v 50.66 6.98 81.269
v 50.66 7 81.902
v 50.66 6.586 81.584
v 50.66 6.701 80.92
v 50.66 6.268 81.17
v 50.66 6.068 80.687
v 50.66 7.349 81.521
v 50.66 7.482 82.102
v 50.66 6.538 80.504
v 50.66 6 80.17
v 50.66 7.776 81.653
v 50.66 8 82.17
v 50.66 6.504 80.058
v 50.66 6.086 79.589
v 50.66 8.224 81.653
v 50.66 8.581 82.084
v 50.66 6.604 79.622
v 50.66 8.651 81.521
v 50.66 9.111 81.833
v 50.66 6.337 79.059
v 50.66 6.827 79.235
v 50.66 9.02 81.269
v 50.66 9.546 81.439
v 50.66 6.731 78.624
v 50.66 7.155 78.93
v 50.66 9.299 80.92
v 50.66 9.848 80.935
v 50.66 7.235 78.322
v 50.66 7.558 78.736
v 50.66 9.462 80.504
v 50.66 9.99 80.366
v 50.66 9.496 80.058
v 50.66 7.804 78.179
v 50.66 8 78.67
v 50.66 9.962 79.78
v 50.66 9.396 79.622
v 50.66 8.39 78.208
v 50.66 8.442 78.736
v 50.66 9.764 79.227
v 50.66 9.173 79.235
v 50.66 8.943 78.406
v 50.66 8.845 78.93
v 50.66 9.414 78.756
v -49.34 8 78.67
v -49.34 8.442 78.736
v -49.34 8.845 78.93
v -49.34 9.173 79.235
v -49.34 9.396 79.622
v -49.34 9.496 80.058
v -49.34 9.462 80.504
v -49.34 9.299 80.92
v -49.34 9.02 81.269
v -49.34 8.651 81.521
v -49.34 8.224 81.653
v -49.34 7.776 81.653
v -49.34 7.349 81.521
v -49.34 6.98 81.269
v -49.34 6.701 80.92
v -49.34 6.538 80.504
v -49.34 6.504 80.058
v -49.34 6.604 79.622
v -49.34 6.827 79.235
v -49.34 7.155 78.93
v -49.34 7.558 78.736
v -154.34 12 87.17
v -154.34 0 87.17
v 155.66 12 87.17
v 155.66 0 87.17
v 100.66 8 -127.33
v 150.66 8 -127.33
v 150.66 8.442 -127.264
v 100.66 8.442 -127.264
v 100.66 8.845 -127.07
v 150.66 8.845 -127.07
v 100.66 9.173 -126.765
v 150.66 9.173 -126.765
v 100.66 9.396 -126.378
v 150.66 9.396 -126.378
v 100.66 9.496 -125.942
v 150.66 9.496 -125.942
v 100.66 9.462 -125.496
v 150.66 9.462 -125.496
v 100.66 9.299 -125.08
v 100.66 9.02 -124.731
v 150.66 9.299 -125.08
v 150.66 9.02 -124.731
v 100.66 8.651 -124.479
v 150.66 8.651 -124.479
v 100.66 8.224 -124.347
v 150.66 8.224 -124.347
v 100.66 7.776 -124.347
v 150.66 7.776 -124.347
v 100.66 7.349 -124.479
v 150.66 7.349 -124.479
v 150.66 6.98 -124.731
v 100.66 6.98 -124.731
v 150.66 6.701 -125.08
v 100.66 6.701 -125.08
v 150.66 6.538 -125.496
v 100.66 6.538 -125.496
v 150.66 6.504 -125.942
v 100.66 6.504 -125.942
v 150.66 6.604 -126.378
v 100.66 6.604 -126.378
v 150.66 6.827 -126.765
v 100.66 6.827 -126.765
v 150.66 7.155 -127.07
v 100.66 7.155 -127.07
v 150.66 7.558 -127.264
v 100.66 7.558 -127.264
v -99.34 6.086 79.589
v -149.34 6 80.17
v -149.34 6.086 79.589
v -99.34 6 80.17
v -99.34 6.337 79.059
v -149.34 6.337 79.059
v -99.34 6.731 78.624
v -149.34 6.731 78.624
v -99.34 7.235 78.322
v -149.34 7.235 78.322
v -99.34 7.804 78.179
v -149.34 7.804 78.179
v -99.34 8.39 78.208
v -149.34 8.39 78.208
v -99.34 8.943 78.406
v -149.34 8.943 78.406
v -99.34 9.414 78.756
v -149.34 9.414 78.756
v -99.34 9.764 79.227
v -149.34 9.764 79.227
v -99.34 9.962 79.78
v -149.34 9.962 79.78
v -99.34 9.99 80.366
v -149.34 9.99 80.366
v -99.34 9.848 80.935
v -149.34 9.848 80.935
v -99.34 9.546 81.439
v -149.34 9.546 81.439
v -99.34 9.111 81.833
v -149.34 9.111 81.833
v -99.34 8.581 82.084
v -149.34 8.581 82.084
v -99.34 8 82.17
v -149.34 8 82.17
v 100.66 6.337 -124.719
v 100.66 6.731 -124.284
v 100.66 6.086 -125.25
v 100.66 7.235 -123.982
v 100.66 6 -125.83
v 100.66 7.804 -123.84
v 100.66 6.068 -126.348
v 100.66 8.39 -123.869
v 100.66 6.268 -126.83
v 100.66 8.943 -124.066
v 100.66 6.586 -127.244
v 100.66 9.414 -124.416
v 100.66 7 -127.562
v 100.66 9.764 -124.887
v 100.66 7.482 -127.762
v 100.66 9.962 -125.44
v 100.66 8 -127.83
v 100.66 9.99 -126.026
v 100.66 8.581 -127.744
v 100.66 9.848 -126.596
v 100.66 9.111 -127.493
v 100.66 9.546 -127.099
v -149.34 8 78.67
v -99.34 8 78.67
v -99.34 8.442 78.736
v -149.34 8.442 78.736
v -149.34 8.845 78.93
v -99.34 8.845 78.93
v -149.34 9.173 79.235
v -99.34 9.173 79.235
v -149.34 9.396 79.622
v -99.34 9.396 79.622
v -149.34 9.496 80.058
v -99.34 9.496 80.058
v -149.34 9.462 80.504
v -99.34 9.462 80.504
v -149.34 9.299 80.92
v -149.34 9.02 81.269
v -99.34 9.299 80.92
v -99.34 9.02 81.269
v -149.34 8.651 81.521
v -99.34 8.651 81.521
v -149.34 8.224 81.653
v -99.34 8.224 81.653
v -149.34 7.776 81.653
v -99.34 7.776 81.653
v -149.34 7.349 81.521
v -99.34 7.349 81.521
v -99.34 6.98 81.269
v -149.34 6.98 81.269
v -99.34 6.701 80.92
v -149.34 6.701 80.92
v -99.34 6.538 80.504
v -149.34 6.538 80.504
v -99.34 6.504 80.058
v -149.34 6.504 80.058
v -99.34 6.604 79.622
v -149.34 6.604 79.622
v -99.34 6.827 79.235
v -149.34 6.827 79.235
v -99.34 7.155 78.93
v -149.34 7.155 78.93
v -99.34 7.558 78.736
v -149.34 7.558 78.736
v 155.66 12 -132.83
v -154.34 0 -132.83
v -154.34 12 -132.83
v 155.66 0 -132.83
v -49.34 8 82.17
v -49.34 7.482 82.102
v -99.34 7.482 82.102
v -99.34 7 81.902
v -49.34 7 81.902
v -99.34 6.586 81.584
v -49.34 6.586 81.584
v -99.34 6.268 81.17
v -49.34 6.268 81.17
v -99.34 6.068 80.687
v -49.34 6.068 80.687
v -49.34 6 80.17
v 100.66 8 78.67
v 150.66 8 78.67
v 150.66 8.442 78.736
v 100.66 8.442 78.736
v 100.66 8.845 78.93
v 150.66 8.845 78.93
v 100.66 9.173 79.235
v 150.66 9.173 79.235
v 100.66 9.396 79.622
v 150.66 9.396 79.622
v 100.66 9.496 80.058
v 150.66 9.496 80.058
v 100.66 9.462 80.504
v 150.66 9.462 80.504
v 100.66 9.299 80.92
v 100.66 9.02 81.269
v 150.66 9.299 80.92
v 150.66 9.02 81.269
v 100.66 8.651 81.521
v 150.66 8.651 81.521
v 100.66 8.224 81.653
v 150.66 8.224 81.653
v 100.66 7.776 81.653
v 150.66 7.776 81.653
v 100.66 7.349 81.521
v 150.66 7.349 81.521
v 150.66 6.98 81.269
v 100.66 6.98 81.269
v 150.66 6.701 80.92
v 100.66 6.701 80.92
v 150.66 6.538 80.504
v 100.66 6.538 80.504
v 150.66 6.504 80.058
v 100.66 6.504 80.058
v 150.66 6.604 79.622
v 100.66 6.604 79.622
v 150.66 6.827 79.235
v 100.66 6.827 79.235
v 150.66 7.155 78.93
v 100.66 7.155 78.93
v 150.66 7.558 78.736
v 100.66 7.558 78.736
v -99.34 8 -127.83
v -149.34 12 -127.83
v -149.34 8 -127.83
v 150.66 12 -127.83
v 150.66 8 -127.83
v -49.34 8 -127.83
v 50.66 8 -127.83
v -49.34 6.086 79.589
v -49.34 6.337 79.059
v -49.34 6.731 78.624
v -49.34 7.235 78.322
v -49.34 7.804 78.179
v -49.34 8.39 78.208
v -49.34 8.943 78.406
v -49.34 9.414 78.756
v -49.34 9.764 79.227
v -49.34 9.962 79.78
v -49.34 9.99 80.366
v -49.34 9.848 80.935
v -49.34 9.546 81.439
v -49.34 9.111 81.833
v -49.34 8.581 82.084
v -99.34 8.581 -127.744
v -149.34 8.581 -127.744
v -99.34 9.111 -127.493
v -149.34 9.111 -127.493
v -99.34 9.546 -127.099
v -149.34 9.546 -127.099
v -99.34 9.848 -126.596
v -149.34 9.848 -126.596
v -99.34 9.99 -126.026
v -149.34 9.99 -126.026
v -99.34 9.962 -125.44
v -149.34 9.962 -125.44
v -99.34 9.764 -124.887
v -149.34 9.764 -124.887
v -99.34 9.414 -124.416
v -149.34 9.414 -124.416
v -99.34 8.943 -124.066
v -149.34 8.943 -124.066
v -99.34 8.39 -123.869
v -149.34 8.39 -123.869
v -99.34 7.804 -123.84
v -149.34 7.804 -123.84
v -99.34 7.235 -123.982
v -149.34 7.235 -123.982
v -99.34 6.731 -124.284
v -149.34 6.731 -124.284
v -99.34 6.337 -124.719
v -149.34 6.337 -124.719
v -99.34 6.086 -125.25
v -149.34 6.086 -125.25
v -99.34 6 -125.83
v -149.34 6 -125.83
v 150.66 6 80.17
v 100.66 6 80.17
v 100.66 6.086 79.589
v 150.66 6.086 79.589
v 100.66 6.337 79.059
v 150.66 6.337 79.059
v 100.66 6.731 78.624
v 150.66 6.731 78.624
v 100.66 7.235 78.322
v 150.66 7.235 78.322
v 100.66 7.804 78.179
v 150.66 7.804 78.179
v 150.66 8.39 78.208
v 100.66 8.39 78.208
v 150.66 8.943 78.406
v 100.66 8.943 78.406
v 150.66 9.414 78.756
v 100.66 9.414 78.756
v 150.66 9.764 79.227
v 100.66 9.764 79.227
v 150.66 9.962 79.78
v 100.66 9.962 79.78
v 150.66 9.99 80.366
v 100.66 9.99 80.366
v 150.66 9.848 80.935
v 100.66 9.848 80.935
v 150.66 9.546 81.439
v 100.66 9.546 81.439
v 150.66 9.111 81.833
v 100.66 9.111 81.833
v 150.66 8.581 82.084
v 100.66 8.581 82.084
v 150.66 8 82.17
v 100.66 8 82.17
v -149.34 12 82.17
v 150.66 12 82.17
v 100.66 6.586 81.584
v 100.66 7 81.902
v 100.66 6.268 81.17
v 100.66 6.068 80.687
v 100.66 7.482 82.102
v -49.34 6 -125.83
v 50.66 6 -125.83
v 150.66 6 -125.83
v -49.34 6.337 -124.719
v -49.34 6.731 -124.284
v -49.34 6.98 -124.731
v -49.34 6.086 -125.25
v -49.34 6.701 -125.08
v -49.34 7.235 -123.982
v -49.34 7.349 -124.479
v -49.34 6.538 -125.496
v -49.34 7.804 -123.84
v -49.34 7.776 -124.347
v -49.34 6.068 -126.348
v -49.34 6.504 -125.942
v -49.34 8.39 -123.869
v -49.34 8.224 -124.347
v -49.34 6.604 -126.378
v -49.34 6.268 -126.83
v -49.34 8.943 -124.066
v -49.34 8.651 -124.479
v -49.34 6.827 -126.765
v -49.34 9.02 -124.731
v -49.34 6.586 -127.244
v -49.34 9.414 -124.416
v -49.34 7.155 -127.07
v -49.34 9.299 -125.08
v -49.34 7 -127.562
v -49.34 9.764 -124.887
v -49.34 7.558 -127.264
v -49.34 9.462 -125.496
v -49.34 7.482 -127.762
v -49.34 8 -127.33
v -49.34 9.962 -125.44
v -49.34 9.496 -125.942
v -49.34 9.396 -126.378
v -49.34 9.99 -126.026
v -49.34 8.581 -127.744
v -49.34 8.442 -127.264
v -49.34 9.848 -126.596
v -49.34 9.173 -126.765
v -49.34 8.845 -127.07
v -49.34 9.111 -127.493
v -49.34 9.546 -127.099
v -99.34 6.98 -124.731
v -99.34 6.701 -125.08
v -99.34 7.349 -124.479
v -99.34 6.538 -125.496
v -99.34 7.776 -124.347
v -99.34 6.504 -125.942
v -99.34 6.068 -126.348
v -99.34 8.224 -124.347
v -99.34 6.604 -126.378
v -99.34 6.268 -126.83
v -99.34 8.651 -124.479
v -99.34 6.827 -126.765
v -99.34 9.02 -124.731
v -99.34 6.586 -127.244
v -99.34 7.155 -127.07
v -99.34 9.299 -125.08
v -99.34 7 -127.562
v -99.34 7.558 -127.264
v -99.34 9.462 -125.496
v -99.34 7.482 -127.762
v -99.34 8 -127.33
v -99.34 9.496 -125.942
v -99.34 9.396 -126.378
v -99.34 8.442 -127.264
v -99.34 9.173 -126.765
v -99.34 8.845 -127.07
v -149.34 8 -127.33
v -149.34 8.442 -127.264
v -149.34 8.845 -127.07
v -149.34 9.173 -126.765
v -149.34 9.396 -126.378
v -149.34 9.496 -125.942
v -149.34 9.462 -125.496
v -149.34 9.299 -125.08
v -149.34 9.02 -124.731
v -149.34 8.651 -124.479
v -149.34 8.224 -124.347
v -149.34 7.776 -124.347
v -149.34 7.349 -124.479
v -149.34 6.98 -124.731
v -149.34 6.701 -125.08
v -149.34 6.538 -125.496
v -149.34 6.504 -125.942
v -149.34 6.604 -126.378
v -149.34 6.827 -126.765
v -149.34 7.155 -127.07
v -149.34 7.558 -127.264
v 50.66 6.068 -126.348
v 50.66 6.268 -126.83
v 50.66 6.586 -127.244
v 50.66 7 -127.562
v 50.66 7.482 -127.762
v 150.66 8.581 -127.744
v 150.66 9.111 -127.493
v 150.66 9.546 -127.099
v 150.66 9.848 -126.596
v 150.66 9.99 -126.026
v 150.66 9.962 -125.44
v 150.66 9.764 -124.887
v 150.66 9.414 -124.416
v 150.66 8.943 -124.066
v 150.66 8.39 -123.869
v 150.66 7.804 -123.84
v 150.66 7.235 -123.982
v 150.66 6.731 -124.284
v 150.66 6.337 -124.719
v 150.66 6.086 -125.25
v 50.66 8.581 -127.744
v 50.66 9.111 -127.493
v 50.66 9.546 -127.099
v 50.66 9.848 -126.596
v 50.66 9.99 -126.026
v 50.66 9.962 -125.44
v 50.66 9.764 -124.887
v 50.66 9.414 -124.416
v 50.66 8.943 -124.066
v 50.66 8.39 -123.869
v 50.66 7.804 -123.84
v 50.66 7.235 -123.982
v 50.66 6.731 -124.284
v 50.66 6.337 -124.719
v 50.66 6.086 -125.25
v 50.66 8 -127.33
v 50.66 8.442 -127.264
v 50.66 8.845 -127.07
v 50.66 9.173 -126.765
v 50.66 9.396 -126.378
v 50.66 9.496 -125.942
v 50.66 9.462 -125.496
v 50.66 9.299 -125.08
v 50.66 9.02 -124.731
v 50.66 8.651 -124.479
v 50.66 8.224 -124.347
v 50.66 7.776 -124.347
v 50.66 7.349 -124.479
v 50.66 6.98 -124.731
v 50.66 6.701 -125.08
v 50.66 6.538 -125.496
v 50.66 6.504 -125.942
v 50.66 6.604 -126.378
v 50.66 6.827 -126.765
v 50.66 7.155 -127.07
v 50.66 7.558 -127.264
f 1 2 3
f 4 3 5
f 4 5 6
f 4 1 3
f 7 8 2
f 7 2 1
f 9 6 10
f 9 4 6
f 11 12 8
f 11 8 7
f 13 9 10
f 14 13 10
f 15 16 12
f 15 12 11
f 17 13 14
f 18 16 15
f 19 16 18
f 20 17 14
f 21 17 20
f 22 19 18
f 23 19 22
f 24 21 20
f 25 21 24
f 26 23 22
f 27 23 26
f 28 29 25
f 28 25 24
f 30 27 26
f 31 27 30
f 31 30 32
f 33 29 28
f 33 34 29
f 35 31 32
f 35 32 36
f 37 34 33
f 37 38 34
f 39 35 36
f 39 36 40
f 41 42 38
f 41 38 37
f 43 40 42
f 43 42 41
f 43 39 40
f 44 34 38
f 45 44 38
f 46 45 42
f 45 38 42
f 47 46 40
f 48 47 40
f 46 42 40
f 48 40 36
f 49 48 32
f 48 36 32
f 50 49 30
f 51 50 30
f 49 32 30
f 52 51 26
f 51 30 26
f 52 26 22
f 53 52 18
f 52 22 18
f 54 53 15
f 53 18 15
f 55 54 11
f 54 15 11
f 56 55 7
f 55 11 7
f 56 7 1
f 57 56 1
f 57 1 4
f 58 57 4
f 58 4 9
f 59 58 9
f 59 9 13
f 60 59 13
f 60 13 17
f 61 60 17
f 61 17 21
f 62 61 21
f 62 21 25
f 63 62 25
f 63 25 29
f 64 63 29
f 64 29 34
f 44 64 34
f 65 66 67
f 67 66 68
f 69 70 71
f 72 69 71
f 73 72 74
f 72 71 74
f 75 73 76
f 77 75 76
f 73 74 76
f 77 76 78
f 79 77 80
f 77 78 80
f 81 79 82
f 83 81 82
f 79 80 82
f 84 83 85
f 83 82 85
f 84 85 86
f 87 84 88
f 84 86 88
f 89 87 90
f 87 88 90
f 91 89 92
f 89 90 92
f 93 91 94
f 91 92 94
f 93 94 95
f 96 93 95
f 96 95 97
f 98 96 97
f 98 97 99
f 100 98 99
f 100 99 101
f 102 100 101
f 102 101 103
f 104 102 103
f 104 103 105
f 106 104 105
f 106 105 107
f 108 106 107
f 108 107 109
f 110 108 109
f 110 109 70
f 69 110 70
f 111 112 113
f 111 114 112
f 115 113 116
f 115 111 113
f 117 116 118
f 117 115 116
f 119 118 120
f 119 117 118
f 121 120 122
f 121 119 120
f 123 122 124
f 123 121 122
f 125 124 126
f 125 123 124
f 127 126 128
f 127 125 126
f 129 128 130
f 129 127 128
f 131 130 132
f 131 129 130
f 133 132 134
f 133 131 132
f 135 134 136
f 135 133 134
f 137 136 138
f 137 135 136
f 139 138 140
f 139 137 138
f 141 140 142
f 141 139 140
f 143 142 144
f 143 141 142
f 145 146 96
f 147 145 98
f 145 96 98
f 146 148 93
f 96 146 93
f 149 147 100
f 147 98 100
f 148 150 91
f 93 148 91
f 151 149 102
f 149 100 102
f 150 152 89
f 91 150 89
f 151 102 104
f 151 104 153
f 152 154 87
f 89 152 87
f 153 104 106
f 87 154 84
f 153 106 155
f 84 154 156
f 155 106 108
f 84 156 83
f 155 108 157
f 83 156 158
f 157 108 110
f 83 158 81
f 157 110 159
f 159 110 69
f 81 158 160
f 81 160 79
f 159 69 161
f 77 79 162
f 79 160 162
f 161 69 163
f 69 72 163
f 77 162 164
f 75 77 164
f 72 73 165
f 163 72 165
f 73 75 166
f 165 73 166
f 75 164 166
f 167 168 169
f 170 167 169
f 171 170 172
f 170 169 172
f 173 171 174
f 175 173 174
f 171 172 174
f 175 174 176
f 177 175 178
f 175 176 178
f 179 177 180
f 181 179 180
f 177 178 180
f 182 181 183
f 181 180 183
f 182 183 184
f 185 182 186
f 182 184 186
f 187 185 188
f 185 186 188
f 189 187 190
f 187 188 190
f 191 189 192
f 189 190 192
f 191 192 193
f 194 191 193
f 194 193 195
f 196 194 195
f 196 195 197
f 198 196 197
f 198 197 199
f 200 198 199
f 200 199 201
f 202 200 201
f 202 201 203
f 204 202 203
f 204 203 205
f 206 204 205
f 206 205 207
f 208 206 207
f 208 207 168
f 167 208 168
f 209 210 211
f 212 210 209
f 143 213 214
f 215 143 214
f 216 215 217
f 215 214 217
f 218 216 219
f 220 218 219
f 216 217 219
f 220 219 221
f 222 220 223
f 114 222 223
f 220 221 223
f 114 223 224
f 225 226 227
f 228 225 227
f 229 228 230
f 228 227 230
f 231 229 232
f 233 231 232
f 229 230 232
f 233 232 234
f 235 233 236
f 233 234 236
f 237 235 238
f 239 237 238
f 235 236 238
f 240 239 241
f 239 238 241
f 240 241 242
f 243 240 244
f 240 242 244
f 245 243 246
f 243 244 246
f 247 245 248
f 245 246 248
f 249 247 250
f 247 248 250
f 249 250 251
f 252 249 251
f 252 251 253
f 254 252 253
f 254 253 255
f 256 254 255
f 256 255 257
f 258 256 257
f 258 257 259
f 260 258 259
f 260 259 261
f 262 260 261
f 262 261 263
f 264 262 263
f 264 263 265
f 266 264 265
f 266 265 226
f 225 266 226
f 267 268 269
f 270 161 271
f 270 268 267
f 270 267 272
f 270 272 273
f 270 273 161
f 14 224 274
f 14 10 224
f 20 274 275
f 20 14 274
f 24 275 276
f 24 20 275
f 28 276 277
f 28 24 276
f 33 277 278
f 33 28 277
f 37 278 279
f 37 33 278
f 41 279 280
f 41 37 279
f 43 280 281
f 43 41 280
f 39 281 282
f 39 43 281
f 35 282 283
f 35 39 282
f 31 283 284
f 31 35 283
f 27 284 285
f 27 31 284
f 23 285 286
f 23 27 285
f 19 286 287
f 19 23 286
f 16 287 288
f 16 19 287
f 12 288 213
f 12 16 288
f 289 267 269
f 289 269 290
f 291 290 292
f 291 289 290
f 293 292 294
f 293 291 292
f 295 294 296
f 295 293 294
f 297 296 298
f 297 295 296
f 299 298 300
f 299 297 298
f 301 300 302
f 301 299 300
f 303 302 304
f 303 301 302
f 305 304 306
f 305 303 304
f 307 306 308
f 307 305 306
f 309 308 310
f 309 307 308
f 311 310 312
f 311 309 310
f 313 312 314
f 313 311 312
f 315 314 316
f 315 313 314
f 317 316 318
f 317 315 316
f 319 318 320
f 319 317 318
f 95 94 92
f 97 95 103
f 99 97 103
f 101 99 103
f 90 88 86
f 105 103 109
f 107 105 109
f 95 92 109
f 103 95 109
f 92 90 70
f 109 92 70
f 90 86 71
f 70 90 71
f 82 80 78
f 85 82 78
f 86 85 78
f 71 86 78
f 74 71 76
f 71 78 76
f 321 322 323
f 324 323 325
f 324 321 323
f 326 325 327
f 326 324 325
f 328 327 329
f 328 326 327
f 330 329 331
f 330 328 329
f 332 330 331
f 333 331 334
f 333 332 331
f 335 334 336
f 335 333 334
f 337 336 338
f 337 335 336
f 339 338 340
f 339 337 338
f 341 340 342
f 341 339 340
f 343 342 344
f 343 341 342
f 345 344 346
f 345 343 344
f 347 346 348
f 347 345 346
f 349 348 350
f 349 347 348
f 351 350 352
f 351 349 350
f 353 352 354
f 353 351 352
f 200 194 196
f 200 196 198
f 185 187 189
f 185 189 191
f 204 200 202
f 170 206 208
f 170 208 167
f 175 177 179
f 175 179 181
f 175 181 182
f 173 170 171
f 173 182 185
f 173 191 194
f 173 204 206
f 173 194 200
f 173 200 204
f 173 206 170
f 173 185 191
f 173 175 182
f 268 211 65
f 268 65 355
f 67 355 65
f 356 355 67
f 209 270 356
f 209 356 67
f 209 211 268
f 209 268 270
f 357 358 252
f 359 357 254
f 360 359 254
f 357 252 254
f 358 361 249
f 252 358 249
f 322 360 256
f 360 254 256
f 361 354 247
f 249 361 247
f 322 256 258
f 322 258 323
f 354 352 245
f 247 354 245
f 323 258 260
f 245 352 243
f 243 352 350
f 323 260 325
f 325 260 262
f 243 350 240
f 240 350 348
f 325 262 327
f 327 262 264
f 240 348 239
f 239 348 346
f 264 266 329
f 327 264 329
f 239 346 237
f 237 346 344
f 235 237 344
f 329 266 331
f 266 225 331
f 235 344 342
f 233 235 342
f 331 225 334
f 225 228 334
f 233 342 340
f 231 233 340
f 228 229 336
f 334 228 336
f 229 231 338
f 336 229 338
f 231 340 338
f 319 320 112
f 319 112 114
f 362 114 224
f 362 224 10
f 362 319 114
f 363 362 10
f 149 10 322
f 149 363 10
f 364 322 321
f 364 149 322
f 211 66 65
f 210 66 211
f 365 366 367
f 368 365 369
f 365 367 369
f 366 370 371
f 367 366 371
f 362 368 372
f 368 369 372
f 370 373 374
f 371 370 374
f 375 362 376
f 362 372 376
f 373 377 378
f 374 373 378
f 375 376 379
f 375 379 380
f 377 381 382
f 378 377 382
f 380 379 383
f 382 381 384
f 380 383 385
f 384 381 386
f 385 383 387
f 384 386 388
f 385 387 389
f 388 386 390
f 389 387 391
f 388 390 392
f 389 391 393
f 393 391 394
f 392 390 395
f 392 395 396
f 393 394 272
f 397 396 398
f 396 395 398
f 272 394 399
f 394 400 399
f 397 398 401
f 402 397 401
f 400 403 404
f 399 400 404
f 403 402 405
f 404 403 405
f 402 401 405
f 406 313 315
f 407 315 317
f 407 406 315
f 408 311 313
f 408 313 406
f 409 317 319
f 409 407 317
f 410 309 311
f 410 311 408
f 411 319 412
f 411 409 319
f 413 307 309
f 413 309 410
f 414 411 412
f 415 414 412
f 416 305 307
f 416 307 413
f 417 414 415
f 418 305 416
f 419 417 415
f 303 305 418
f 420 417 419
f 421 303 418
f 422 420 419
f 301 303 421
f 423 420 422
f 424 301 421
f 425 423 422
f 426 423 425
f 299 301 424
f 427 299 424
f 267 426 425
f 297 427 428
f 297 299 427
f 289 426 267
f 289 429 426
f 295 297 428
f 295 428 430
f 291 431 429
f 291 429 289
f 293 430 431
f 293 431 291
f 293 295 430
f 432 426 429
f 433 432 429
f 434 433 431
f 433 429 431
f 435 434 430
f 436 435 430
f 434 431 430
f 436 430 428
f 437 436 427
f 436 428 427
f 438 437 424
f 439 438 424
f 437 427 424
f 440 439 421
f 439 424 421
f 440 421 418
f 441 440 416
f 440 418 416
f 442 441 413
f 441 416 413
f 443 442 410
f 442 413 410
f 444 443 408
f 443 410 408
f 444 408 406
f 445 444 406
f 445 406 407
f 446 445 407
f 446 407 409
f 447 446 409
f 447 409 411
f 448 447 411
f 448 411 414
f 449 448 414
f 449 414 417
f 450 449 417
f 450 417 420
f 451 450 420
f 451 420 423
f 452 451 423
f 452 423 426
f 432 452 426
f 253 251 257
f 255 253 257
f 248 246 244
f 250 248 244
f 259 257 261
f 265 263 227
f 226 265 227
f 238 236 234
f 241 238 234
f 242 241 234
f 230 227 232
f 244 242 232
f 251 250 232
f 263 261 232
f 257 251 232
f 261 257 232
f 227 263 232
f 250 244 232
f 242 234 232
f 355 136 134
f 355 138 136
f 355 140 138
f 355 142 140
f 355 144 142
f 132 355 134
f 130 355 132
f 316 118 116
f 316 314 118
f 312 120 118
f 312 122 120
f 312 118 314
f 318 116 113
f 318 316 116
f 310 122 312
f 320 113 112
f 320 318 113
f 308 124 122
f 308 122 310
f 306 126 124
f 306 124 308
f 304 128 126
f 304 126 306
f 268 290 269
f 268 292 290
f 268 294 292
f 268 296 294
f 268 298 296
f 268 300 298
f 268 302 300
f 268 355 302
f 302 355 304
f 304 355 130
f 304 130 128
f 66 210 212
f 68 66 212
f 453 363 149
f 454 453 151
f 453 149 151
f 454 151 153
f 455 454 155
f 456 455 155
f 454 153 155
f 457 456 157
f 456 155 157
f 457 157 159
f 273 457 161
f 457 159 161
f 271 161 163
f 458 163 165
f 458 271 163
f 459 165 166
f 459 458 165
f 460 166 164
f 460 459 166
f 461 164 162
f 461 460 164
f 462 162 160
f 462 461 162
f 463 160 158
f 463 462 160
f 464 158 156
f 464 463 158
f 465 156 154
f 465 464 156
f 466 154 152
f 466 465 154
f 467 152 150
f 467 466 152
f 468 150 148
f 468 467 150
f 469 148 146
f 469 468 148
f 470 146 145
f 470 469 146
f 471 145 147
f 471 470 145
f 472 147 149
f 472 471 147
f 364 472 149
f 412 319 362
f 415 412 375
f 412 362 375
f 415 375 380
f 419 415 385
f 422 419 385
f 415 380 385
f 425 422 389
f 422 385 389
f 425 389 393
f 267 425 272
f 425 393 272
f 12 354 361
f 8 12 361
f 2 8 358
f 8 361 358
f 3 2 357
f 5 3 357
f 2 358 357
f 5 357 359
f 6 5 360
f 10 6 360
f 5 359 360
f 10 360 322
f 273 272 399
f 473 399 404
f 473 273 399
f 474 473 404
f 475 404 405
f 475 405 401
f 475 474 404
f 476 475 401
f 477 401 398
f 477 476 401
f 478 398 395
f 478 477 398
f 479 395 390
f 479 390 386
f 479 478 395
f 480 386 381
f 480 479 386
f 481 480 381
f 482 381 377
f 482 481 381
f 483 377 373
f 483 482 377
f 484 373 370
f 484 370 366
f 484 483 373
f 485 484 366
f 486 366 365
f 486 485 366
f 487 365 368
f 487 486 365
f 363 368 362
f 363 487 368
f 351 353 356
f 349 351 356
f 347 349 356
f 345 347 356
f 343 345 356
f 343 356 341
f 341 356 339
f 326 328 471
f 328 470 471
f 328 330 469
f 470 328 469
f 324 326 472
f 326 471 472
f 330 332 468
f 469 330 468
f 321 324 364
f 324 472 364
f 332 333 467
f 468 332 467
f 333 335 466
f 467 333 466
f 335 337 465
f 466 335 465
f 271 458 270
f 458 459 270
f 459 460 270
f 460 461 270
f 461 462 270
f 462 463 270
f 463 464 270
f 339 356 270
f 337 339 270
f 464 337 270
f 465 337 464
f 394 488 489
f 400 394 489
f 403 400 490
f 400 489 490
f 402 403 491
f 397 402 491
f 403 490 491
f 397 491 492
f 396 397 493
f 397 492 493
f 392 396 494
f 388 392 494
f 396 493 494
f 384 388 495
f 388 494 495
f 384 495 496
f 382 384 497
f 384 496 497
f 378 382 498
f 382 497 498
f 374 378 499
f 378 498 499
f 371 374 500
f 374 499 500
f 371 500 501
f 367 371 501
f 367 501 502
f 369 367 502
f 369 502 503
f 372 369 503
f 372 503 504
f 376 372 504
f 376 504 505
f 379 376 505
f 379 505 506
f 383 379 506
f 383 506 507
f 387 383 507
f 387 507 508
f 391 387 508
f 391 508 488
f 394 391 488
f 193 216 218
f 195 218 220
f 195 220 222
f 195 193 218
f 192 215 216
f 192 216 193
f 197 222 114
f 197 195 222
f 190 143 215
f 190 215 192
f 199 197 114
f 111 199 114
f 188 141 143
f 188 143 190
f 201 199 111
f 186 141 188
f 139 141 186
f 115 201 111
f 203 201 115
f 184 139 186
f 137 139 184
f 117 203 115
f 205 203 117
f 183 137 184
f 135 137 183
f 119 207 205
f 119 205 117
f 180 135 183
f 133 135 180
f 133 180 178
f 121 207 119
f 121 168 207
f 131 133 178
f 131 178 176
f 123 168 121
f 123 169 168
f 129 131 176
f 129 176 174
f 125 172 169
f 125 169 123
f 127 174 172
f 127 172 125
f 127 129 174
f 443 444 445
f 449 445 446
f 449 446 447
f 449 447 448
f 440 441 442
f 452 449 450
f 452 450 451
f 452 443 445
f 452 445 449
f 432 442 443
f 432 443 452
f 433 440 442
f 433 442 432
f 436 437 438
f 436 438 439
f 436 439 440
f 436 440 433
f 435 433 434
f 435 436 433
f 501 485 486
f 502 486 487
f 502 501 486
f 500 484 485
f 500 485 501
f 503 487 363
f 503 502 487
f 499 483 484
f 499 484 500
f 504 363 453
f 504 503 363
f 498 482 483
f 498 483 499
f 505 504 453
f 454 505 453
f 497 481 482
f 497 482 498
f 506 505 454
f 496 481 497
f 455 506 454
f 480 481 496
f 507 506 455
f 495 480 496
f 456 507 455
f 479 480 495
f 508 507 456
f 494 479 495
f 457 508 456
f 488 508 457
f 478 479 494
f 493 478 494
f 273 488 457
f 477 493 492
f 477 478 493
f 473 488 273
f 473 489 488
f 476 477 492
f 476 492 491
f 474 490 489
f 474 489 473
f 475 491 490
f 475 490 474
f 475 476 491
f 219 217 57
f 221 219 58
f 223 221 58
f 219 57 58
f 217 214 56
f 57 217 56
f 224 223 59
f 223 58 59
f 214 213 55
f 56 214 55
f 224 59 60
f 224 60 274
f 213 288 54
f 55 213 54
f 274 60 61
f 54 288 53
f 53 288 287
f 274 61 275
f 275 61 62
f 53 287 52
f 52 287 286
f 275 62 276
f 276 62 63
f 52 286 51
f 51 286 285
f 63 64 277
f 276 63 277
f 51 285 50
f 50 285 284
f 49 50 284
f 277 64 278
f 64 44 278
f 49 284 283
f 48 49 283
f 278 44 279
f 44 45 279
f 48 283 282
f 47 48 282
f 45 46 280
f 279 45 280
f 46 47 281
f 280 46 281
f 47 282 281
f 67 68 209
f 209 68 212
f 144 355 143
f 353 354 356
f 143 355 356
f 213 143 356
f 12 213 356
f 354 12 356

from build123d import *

# Parameters (mm, degrees)
SKETCH_1_W          = 310
SKETCH_1_H          = 220
EXTRUDE_1_DEPTH     = 12
SKETCH_2_W          = 300
SKETCH_2_H          = 210
CUT_EXTRUDE_4_DEPTH = 6
SKETCH_6_W          = 300
SKETCH_6_H          = 2
EXTRUDE_3_DEPTH     = 2
SKETCH_8_R          = 2
CUT_EXTRUDE_5_DEPTH = 300
SKETCH_8_2_R        = 2
SKETCH_8_2_R_2      = 1.5
EXTRUDE_1_2_DEPTH   = 300
SKETCH_10_R         = 2
CUT_EXTRUDE_6_DEPTH = 300
SKETCH_10_2_R       = 2
SKETCH_10_2_R_2     = 1.5
EXTRUDE_2_DEPTH     = 300
SKETCH_12_R         = 2
CUT_EXTRUDE_7_DEPTH = 50
SKETCH_13_R         = 2
CUT_EXTRUDE_8_DEPTH = 50


with BuildPart() as part:
    # 草图1 → Extrude 1 (new body)
    with BuildSketch(Plane(origin=(0, 0, 0), x_dir=(1, 0, 0), z_dir=(0, 1, 0))):
        with Locations((0.660377358, 22.830188679)):
            Rectangle(SKETCH_1_W, SKETCH_1_H)
    extrude(amount=EXTRUDE_1_DEPTH)

    # 草图2 → 切除-拉伸4 (cut)
    with BuildSketch(Plane(origin=(0, 12, 0), x_dir=(1, 0, 0), z_dir=(0, 1, 0))):
        with Locations((0.660377358, 22.830188679)):
            Rectangle(SKETCH_2_W, SKETCH_2_H)
    extrude(amount=-CUT_EXTRUDE_4_DEPTH, mode=Mode.SUBTRACT)

    # 草图6 → 凸台-拉伸3 (add)
    with BuildSketch(Plane(origin=(0, 6, 0), x_dir=(1, 0, 0), z_dir=(0, 1, 0))):
        with Locations((0.660377358, 126.830188679)):
            Rectangle(SKETCH_6_W, SKETCH_6_H)
        with Locations((0.660377358, -81.169811321)):
            Rectangle(SKETCH_6_W, SKETCH_6_H)
    extrude(amount=EXTRUDE_3_DEPTH)

    # 草图8 → 切除-拉伸5 (cut)
    with BuildSketch(Plane(origin=(150.660377358, 0, 0), x_dir=(0, 0, -1), z_dir=(1, 0, 0))):
        with Locations((-80.169811321, 8)):
            Circle(SKETCH_8_R)
    extrude(amount=-CUT_EXTRUDE_5_DEPTH, mode=Mode.SUBTRACT)

    # 草图8<2> → Extrude 1 2 (add)
    with BuildSketch(Plane(origin=(150.660377358, 0, 0), x_dir=(0, 0, -1), z_dir=(1, 0, 0))):
        with Locations((-80.169811321, 8)):
            Circle(SKETCH_8_2_R)
        with Locations((-80.169811321, 8)):
            Circle(SKETCH_8_2_R_2, mode=Mode.SUBTRACT)
    extrude(amount=-EXTRUDE_1_2_DEPTH)

    # 草图10 → 切除-拉伸6 (cut)
    with BuildSketch(Plane(origin=(150.660377358, 0, 0), x_dir=(0, 0, -1), z_dir=(1, 0, 0))):
        with Locations((125.830188679, 8)):
            Circle(SKETCH_10_R)
    extrude(amount=-CUT_EXTRUDE_6_DEPTH, mode=Mode.SUBTRACT)

    # 草图10<2> → 拉伸-薄壁2 (add)
    with BuildSketch(Plane(origin=(150.660377358, 0, 0), x_dir=(0, 0, -1), z_dir=(1, 0, 0))):
        with Locations((125.830188679, 8)):
            Circle(SKETCH_10_2_R)
        with Locations((125.830188679, 8)):
            Circle(SKETCH_10_2_R_2, mode=Mode.SUBTRACT)
    extrude(amount=-EXTRUDE_2_DEPTH)

    # 草图12 → 切除-拉伸7 (cut)
    with BuildSketch(Plane(origin=(100.660377358, 0, 0), x_dir=(0, 0, -1), z_dir=(1, 0, 0))):
        with Locations((-80.169811321, 8)):
            Circle(SKETCH_12_R)
        with Locations((125.830188679, 8)):
            Circle(SKETCH_12_R)
    extrude(amount=-CUT_EXTRUDE_7_DEPTH, mode=Mode.SUBTRACT)

    # 草图13 → 切除-拉伸8 (cut)
    with BuildSketch(Plane(origin=(-49.339622642, 0, 0), x_dir=(0, 0, -1), z_dir=(1, 0, 0))):
        with Locations((-80.169811321, 8)):
            Circle(SKETCH_13_R)
        with Locations((125.830188679, 8)):
            Circle(SKETCH_13_R)
    extrude(amount=-CUT_EXTRUDE_8_DEPTH, mode=Mode.SUBTRACT)


solid = part.part
